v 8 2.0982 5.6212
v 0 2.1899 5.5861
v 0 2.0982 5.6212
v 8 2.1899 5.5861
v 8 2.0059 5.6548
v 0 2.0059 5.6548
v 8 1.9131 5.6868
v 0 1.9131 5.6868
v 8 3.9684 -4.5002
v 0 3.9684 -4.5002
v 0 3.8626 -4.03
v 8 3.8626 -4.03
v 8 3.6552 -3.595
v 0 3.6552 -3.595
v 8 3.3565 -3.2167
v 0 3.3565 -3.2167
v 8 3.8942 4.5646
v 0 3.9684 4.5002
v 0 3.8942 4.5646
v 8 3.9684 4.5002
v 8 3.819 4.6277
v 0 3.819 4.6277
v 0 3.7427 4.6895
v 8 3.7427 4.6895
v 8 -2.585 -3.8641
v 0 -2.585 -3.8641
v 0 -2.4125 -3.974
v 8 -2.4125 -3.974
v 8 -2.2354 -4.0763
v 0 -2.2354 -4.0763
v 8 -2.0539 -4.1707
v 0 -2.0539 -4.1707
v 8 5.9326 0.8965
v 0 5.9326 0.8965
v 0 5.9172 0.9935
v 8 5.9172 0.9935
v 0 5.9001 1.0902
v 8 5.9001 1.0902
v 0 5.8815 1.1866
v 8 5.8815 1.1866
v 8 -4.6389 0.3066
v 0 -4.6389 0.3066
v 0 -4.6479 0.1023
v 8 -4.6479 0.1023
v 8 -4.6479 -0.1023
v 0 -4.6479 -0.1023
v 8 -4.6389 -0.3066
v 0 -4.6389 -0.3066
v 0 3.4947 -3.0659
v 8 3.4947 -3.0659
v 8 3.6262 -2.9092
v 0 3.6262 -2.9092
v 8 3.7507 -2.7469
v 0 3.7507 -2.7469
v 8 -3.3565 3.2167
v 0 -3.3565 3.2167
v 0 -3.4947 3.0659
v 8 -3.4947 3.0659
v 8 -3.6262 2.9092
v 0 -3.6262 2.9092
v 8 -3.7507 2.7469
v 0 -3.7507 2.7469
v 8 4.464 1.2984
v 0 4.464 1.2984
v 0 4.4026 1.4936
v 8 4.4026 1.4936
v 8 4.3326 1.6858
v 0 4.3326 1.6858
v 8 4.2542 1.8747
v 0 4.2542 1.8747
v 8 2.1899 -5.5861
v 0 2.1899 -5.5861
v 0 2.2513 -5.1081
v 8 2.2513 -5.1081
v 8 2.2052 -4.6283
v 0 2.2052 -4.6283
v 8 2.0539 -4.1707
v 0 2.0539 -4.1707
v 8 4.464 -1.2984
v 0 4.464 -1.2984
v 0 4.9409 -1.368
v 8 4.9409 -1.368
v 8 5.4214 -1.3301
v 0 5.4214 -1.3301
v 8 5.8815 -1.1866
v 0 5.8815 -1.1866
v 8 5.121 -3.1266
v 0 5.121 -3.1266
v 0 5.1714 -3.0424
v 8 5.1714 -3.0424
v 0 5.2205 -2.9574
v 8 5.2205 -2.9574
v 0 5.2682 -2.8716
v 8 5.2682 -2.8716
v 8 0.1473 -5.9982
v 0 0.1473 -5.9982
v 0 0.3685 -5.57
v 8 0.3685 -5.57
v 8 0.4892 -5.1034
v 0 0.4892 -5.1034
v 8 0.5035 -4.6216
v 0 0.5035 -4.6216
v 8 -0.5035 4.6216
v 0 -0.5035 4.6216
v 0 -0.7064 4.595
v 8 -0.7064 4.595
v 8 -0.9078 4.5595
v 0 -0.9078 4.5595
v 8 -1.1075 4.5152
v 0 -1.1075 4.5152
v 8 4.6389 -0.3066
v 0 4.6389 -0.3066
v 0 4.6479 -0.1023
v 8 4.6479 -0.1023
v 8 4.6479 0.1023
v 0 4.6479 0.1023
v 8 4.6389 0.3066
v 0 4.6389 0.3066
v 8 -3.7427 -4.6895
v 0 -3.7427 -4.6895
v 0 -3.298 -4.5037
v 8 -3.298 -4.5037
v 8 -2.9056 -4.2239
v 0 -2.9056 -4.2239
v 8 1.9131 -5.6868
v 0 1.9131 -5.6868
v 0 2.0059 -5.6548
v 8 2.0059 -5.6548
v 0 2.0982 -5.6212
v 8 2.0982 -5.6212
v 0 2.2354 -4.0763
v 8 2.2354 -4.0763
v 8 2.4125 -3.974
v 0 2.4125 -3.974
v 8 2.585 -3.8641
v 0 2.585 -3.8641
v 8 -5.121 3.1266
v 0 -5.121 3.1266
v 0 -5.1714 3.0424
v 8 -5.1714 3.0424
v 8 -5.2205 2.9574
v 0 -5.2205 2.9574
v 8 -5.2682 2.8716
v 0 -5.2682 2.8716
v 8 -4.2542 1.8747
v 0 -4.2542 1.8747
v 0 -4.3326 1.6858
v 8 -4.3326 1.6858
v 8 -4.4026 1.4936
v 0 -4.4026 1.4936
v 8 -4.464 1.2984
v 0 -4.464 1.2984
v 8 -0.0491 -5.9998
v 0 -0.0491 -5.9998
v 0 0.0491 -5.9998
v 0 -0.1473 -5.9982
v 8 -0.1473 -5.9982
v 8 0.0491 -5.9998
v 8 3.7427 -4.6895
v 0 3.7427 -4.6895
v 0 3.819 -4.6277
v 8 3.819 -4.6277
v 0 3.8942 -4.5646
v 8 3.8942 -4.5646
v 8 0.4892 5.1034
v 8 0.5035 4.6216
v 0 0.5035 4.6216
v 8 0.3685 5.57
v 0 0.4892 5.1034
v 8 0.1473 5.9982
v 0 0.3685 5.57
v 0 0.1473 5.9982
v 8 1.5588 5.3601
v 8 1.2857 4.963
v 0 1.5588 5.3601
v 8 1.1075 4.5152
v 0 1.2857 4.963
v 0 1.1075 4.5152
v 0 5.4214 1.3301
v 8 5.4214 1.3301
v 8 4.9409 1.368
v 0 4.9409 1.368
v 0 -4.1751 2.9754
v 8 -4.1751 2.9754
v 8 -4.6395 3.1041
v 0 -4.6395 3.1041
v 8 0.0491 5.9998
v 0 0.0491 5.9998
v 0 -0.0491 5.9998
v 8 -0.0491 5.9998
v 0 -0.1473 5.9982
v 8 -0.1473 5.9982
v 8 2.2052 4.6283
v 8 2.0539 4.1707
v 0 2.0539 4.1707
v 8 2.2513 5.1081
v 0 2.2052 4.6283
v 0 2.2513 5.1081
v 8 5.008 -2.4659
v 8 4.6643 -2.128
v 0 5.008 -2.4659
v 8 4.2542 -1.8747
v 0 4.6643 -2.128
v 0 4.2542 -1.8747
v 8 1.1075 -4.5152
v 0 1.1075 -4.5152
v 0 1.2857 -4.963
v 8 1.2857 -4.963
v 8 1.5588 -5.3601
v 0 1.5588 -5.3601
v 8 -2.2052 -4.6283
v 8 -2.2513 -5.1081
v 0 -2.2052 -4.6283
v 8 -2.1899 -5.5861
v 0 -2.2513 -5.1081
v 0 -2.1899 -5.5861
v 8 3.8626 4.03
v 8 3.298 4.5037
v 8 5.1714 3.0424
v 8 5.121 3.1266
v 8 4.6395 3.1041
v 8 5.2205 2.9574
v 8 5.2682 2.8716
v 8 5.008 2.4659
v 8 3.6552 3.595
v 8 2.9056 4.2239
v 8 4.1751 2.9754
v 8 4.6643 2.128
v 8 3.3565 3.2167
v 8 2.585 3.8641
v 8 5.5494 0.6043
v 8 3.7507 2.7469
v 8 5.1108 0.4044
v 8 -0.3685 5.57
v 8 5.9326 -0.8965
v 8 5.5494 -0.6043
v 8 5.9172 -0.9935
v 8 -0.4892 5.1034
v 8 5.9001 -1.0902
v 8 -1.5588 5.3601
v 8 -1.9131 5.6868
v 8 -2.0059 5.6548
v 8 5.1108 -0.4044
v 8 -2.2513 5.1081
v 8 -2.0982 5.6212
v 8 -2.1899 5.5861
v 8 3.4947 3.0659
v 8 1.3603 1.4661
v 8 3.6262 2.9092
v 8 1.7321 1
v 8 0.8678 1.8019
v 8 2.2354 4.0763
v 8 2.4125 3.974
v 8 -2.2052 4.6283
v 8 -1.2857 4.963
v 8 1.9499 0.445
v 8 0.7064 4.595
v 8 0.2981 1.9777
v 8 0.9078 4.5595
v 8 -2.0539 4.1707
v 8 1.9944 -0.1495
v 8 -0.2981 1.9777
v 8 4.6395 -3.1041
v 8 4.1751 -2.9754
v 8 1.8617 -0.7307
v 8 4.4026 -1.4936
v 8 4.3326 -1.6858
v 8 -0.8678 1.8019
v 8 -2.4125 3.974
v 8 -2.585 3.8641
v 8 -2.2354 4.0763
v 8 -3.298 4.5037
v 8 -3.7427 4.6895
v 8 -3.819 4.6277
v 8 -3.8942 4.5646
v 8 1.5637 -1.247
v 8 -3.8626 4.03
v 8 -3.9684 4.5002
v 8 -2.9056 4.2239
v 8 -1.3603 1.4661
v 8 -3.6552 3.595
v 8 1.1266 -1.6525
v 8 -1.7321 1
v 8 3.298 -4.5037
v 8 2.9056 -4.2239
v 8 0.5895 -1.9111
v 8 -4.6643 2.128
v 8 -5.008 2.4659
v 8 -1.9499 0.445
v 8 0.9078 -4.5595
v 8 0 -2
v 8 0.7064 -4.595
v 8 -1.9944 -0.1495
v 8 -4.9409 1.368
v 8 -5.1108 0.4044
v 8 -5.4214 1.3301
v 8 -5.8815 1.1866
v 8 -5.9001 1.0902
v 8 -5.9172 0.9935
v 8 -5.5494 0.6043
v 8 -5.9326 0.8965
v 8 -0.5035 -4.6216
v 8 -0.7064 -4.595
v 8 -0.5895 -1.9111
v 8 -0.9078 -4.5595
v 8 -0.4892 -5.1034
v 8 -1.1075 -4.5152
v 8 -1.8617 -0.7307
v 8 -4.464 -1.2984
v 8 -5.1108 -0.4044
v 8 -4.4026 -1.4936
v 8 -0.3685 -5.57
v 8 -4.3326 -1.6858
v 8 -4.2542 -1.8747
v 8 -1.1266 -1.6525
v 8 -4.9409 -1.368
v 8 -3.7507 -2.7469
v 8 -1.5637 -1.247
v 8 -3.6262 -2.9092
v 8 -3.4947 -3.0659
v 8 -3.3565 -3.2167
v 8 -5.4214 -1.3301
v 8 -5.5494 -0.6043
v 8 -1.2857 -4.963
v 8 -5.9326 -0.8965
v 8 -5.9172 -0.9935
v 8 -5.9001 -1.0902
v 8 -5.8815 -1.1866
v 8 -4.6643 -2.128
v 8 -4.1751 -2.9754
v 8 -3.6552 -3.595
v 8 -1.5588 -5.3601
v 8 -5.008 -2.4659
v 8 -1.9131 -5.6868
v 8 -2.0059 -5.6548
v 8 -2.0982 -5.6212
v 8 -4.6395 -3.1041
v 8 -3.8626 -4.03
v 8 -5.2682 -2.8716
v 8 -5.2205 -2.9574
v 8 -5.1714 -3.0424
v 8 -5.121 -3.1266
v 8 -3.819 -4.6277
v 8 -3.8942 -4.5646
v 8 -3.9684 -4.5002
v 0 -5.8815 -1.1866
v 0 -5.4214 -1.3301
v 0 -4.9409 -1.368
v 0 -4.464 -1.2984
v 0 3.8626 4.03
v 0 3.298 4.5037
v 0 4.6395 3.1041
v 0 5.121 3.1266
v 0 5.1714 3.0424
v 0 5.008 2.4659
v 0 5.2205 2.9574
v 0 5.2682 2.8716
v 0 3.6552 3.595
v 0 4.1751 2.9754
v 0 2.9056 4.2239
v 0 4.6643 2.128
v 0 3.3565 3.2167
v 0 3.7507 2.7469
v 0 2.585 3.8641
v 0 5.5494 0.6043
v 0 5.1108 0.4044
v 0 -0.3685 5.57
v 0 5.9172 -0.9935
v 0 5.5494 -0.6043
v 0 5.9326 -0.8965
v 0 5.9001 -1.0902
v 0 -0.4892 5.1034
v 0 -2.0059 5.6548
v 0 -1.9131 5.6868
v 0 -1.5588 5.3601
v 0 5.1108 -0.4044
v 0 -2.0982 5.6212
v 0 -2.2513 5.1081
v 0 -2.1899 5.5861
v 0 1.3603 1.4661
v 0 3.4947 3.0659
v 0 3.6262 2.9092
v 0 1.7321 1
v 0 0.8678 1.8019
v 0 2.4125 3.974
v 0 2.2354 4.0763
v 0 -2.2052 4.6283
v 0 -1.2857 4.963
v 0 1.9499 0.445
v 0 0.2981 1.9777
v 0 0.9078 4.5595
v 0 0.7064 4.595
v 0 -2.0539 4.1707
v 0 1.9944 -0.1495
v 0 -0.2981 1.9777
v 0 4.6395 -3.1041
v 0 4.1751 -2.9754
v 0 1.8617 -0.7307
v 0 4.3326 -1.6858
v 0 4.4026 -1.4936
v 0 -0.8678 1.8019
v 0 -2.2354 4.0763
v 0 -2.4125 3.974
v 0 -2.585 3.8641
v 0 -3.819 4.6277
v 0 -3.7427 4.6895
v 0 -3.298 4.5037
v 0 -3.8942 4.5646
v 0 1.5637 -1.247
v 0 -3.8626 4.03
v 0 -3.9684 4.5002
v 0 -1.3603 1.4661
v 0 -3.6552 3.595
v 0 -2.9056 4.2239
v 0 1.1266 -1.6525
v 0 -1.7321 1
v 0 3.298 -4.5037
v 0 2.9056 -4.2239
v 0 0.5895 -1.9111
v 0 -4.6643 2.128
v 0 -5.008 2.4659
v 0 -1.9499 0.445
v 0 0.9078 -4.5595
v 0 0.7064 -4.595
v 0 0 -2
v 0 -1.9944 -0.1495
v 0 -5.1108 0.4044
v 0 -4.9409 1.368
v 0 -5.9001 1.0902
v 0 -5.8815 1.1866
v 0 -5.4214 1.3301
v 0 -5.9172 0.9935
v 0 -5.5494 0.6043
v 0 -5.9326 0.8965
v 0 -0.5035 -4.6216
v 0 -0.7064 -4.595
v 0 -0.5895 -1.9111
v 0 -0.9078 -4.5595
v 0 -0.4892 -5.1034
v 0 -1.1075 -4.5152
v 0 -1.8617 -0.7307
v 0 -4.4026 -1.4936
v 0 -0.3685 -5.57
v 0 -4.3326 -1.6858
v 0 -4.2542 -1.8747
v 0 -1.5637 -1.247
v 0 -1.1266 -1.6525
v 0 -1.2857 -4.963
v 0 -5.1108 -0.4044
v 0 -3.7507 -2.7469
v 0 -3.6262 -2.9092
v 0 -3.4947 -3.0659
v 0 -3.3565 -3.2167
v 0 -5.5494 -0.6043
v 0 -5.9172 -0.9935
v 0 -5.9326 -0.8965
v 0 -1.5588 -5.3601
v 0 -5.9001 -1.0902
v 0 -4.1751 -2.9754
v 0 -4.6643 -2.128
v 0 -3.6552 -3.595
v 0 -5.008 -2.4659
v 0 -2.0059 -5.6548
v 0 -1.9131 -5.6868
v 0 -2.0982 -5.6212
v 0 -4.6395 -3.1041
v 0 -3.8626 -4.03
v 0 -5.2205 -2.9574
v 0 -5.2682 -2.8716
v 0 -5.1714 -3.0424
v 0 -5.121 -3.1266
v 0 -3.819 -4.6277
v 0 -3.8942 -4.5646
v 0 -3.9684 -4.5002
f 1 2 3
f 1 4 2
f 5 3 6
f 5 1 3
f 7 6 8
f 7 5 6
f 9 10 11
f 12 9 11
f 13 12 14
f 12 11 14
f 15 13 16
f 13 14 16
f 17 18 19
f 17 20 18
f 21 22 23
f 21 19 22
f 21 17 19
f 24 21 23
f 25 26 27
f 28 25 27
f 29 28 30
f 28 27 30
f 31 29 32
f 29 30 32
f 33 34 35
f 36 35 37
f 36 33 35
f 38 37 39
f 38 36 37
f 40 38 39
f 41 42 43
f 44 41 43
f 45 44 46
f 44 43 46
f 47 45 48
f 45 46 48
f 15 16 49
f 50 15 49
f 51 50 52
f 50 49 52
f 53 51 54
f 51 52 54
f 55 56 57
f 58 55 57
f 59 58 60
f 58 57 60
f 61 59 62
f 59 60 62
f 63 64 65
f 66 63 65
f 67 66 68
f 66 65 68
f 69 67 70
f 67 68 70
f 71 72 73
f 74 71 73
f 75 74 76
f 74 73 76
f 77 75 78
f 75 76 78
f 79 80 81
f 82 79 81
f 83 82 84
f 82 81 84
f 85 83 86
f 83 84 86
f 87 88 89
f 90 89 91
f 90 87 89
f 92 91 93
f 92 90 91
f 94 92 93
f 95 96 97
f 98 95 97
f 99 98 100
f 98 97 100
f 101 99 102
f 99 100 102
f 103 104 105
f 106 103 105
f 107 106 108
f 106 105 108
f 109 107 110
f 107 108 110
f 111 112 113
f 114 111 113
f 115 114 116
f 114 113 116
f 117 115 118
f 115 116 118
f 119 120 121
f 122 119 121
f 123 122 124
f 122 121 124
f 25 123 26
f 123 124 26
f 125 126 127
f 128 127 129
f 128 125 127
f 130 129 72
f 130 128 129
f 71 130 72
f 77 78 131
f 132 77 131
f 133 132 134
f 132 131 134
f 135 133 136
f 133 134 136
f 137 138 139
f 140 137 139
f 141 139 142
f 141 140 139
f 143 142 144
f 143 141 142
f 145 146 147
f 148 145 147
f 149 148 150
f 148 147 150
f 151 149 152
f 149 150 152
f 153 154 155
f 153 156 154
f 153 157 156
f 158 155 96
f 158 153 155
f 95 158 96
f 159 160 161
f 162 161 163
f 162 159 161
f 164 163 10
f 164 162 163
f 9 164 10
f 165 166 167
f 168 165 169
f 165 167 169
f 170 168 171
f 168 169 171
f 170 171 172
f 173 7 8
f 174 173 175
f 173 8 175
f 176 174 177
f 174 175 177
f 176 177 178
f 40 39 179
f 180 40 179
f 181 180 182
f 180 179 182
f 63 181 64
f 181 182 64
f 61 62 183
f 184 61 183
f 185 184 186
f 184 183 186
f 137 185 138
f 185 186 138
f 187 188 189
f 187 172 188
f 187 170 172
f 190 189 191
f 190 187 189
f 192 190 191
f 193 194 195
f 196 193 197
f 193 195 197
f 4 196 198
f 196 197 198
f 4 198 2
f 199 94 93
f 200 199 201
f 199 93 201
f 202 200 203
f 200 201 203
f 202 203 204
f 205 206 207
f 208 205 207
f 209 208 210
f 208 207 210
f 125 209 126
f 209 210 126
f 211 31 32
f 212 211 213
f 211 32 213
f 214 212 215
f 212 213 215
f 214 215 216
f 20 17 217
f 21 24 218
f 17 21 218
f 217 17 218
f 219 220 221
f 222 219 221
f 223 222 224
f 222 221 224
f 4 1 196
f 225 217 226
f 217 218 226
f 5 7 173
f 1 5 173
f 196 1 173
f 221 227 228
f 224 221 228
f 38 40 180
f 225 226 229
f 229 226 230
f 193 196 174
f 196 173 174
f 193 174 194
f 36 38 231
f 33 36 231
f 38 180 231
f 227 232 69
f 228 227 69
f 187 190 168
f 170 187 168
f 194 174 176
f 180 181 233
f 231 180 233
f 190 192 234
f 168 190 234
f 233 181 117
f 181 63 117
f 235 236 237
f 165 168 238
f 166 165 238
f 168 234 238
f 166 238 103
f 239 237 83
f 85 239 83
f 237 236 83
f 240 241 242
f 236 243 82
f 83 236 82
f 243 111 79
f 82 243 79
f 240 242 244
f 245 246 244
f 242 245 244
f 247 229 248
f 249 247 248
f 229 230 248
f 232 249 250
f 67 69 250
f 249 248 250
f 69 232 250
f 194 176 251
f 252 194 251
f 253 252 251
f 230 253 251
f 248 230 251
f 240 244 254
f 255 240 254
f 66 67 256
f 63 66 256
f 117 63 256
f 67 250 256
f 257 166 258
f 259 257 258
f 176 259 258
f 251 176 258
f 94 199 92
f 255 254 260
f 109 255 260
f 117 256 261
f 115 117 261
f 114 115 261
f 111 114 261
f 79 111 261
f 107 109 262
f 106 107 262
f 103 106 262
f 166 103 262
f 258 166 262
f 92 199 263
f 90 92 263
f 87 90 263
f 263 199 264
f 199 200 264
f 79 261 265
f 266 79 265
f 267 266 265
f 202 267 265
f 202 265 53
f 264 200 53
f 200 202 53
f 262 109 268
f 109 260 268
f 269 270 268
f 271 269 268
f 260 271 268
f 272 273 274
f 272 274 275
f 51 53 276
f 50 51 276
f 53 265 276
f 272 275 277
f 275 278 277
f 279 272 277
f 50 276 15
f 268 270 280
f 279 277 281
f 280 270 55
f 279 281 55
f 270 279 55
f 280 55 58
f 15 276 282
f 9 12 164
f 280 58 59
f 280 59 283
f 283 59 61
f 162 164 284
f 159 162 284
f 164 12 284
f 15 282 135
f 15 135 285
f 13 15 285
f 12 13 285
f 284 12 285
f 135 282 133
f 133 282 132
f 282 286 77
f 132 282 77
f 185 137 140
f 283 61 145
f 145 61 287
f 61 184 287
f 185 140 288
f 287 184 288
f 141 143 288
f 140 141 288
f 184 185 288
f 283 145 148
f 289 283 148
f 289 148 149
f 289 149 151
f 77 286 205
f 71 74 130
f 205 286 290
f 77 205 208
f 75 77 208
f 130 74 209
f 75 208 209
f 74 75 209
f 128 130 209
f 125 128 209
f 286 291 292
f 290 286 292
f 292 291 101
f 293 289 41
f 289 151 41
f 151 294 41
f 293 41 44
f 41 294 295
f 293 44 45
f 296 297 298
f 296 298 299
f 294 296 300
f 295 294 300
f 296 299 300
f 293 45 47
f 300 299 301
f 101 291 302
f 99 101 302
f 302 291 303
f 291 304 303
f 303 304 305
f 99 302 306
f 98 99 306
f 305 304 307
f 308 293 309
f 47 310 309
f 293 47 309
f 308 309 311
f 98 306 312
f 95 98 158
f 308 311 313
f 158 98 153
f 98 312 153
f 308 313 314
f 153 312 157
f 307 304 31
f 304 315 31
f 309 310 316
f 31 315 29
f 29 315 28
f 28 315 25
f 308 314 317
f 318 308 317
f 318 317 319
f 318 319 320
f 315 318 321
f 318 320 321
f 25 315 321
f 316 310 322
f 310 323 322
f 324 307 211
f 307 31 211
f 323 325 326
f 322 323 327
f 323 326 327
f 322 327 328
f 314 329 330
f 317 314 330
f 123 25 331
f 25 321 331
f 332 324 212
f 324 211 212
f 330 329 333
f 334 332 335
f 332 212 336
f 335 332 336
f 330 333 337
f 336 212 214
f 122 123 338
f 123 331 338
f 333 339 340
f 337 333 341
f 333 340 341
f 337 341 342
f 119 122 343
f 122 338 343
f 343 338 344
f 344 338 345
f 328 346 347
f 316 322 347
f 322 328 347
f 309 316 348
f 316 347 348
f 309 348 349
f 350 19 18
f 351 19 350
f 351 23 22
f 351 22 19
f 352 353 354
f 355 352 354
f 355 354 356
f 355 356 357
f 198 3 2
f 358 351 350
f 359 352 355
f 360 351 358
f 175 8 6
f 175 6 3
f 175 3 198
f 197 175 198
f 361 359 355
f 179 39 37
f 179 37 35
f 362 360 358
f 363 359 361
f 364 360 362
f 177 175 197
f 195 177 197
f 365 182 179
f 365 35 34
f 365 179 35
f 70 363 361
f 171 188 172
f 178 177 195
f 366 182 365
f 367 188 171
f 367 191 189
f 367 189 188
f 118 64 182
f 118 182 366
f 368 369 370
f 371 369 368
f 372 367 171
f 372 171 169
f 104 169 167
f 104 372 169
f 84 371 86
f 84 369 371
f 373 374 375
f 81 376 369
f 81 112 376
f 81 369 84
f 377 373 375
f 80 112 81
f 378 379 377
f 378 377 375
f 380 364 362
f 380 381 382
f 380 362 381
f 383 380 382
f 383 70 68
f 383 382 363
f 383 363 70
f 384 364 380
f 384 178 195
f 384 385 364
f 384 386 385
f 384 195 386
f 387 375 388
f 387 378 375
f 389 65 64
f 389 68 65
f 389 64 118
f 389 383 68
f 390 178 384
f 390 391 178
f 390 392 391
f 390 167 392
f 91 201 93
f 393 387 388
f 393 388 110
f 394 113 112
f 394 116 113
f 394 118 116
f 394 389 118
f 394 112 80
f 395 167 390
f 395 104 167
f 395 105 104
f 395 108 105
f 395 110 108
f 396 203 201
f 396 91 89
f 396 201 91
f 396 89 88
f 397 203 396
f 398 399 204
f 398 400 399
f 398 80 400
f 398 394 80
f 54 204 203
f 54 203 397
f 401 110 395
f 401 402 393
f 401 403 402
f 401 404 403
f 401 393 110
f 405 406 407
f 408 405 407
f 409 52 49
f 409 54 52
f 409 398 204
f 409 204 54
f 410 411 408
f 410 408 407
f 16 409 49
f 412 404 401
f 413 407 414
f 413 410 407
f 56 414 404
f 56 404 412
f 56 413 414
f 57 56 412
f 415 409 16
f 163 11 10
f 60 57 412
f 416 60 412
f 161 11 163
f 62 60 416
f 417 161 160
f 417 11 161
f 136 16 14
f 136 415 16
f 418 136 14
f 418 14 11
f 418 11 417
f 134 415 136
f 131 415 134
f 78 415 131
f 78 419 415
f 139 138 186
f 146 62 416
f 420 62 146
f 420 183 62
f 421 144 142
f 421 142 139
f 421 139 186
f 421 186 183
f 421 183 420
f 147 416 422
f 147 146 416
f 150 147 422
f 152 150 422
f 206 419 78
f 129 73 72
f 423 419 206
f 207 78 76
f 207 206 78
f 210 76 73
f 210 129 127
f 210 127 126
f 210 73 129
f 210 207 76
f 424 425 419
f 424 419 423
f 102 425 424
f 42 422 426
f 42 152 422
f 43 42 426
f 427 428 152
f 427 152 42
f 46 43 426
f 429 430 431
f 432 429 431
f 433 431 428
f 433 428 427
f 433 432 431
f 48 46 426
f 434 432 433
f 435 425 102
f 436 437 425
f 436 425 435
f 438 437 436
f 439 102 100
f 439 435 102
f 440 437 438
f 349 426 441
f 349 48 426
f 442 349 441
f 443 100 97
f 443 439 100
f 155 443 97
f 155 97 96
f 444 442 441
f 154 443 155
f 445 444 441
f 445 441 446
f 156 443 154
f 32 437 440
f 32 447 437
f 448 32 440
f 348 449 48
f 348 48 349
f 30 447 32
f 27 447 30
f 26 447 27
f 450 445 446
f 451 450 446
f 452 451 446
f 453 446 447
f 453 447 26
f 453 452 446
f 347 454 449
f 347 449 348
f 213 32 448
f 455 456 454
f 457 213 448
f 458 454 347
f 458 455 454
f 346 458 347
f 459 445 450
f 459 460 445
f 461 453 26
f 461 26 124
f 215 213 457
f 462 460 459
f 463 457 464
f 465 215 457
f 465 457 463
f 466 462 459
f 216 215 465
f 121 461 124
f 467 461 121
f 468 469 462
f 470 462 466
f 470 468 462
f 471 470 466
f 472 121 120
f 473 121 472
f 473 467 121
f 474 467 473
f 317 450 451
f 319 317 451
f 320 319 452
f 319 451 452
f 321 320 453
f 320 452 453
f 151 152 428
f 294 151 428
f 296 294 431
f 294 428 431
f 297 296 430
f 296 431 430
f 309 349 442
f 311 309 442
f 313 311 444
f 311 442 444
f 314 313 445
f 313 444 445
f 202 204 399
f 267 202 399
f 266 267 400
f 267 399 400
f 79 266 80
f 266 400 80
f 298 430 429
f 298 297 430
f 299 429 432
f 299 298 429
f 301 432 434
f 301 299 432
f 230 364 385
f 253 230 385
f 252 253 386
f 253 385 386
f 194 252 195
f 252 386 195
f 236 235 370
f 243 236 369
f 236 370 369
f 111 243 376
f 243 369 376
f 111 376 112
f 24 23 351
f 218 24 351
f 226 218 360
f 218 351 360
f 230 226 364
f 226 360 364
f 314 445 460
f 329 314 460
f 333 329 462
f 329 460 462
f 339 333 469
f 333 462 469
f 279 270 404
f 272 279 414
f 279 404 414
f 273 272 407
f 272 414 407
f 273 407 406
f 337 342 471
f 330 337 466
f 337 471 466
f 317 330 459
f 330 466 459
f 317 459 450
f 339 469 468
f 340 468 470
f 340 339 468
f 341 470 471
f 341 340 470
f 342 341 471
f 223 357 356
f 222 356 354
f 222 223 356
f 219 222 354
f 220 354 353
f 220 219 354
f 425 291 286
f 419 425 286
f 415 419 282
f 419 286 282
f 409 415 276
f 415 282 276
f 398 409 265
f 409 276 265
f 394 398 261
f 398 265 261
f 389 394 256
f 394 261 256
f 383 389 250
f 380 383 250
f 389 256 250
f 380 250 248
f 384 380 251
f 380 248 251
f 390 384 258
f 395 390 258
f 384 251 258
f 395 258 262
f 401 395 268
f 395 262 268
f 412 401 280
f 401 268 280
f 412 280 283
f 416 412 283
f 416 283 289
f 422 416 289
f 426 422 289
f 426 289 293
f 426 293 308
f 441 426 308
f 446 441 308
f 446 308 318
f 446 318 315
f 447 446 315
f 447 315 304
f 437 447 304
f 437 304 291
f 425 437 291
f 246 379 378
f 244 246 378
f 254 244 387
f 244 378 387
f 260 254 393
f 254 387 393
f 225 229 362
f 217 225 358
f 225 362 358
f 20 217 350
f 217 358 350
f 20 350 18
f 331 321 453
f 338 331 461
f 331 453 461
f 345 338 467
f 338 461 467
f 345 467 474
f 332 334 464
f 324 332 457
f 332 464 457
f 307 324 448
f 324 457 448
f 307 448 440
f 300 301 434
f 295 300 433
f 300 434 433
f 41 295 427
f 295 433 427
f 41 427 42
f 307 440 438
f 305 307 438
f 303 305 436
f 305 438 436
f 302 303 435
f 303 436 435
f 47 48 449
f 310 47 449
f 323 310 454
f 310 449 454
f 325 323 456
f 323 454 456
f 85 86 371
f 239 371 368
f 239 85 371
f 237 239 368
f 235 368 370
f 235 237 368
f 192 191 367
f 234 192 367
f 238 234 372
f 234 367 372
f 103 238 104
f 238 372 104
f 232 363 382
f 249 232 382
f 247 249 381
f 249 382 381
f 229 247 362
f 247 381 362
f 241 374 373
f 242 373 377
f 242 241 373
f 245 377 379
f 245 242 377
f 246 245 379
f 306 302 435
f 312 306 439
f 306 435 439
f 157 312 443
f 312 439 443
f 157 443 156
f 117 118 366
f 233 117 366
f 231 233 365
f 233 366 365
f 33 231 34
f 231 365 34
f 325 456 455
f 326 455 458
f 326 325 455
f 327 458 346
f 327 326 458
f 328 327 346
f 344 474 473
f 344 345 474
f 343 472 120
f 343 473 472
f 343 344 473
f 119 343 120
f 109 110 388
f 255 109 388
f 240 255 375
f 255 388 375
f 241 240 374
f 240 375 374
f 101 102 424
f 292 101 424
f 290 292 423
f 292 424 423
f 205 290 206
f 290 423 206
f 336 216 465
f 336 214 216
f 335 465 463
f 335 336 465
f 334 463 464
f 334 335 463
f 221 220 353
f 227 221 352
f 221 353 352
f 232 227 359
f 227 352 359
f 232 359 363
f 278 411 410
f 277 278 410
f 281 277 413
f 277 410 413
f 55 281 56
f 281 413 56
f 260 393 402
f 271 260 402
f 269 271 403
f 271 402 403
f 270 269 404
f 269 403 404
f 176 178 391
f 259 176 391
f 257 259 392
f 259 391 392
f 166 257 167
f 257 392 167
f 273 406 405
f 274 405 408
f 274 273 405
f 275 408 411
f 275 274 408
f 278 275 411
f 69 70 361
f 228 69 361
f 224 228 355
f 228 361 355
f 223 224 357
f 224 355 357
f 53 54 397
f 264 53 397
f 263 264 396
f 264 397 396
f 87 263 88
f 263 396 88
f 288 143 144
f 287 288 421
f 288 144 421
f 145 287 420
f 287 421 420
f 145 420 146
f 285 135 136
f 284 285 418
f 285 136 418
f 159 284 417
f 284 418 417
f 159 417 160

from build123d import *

# Parameters (mm, degrees)
BASPROSKE_W        = 8
BASPROSKE_H        = 6
TOOTHCUT_DEPTH     = 12.66190379
TEETHCUTS_COUNT    = 18
TEETHCUTS_ANGLE    = 340
BORSKE_R           = 0.5
BORE_DEPTH         = 50.0000508
SKETCH1_R          = 2
CUT_EXTRUDE1_DEPTH = 12.627390673


with BuildPart() as part:
    # BasProSke → Base-Revolve (revolve)
    with BuildSketch(Plane(origin=(0, 0, 0), x_dir=(1, 0, 0), z_dir=(0, 1, 0)), mode=Mode.PRIVATE) as base_revolve_sk:
        with Locations((4, 3)):
            Rectangle(BASPROSKE_W, BASPROSKE_H)
    revolve(base_revolve_sk.sketch.rotate(Axis((-10, 0, 0), (1, 0, 0)), 180), axis=Axis((-10, 0, 0), (1, 0, 0)))

    # TooCutSke → ToothCut (cut, through all)
    with BuildSketch(Plane(origin=(0, 0, 0), x_dir=(0, 0, -1), z_dir=(1, 0, 0))):
        with BuildLine():
            ThreePointArc((0.306649621, 4.638875619), (0, 4.649), (-0.306649621, 4.638875619))
            ThreePointArc((-0.306649621, 4.638875619), (-0.498605842, 5.349852231), (-0.918258882, 5.955018538))
            ThreePointArc((-0.918258882, 5.955018538), (0, 6.0254), (0.918258882, 5.955018538))
            ThreePointArc((0.918258882, 5.955018538), (0.498605842, 5.349852231), (0.306649621, 4.638875619))
        make_face()
    toothcut = extrude(amount=TOOTHCUT_DEPTH, mode=Mode.SUBTRACT)

    # TeethCuts: ToothCut ×18 about axis
    teethcuts_axis = Axis((-10, 0, 0), (1, 0, 0))
    for i in range(1, TEETHCUTS_COUNT):
        add(toothcut.rotate(teethcuts_axis, i * TEETHCUTS_ANGLE / (TEETHCUTS_COUNT - 1)), mode=Mode.SUBTRACT)

    # BorSke → Bore (cut, symmetric)
    with BuildSketch(Plane(origin=(0, 0, 0), x_dir=(0, 0, -1), z_dir=(1, 0, 0))):
        with Locations(Location((0, 0, 0), (0, 0, 180))):
            Circle(BORSKE_R)
    extrude(amount=BORE_DEPTH, both=True, mode=Mode.SUBTRACT)

    # Sketch1 → Cut-Extrude1 (cut, through all)
    with BuildSketch(Plane(origin=(8, 0, 0), x_dir=(0, 0, -1), z_dir=(1, 0, 0))):
        Circle(SKETCH1_R)
    extrude(amount=-CUT_EXTRUDE1_DEPTH, mode=Mode.SUBTRACT)


solid = part.part
